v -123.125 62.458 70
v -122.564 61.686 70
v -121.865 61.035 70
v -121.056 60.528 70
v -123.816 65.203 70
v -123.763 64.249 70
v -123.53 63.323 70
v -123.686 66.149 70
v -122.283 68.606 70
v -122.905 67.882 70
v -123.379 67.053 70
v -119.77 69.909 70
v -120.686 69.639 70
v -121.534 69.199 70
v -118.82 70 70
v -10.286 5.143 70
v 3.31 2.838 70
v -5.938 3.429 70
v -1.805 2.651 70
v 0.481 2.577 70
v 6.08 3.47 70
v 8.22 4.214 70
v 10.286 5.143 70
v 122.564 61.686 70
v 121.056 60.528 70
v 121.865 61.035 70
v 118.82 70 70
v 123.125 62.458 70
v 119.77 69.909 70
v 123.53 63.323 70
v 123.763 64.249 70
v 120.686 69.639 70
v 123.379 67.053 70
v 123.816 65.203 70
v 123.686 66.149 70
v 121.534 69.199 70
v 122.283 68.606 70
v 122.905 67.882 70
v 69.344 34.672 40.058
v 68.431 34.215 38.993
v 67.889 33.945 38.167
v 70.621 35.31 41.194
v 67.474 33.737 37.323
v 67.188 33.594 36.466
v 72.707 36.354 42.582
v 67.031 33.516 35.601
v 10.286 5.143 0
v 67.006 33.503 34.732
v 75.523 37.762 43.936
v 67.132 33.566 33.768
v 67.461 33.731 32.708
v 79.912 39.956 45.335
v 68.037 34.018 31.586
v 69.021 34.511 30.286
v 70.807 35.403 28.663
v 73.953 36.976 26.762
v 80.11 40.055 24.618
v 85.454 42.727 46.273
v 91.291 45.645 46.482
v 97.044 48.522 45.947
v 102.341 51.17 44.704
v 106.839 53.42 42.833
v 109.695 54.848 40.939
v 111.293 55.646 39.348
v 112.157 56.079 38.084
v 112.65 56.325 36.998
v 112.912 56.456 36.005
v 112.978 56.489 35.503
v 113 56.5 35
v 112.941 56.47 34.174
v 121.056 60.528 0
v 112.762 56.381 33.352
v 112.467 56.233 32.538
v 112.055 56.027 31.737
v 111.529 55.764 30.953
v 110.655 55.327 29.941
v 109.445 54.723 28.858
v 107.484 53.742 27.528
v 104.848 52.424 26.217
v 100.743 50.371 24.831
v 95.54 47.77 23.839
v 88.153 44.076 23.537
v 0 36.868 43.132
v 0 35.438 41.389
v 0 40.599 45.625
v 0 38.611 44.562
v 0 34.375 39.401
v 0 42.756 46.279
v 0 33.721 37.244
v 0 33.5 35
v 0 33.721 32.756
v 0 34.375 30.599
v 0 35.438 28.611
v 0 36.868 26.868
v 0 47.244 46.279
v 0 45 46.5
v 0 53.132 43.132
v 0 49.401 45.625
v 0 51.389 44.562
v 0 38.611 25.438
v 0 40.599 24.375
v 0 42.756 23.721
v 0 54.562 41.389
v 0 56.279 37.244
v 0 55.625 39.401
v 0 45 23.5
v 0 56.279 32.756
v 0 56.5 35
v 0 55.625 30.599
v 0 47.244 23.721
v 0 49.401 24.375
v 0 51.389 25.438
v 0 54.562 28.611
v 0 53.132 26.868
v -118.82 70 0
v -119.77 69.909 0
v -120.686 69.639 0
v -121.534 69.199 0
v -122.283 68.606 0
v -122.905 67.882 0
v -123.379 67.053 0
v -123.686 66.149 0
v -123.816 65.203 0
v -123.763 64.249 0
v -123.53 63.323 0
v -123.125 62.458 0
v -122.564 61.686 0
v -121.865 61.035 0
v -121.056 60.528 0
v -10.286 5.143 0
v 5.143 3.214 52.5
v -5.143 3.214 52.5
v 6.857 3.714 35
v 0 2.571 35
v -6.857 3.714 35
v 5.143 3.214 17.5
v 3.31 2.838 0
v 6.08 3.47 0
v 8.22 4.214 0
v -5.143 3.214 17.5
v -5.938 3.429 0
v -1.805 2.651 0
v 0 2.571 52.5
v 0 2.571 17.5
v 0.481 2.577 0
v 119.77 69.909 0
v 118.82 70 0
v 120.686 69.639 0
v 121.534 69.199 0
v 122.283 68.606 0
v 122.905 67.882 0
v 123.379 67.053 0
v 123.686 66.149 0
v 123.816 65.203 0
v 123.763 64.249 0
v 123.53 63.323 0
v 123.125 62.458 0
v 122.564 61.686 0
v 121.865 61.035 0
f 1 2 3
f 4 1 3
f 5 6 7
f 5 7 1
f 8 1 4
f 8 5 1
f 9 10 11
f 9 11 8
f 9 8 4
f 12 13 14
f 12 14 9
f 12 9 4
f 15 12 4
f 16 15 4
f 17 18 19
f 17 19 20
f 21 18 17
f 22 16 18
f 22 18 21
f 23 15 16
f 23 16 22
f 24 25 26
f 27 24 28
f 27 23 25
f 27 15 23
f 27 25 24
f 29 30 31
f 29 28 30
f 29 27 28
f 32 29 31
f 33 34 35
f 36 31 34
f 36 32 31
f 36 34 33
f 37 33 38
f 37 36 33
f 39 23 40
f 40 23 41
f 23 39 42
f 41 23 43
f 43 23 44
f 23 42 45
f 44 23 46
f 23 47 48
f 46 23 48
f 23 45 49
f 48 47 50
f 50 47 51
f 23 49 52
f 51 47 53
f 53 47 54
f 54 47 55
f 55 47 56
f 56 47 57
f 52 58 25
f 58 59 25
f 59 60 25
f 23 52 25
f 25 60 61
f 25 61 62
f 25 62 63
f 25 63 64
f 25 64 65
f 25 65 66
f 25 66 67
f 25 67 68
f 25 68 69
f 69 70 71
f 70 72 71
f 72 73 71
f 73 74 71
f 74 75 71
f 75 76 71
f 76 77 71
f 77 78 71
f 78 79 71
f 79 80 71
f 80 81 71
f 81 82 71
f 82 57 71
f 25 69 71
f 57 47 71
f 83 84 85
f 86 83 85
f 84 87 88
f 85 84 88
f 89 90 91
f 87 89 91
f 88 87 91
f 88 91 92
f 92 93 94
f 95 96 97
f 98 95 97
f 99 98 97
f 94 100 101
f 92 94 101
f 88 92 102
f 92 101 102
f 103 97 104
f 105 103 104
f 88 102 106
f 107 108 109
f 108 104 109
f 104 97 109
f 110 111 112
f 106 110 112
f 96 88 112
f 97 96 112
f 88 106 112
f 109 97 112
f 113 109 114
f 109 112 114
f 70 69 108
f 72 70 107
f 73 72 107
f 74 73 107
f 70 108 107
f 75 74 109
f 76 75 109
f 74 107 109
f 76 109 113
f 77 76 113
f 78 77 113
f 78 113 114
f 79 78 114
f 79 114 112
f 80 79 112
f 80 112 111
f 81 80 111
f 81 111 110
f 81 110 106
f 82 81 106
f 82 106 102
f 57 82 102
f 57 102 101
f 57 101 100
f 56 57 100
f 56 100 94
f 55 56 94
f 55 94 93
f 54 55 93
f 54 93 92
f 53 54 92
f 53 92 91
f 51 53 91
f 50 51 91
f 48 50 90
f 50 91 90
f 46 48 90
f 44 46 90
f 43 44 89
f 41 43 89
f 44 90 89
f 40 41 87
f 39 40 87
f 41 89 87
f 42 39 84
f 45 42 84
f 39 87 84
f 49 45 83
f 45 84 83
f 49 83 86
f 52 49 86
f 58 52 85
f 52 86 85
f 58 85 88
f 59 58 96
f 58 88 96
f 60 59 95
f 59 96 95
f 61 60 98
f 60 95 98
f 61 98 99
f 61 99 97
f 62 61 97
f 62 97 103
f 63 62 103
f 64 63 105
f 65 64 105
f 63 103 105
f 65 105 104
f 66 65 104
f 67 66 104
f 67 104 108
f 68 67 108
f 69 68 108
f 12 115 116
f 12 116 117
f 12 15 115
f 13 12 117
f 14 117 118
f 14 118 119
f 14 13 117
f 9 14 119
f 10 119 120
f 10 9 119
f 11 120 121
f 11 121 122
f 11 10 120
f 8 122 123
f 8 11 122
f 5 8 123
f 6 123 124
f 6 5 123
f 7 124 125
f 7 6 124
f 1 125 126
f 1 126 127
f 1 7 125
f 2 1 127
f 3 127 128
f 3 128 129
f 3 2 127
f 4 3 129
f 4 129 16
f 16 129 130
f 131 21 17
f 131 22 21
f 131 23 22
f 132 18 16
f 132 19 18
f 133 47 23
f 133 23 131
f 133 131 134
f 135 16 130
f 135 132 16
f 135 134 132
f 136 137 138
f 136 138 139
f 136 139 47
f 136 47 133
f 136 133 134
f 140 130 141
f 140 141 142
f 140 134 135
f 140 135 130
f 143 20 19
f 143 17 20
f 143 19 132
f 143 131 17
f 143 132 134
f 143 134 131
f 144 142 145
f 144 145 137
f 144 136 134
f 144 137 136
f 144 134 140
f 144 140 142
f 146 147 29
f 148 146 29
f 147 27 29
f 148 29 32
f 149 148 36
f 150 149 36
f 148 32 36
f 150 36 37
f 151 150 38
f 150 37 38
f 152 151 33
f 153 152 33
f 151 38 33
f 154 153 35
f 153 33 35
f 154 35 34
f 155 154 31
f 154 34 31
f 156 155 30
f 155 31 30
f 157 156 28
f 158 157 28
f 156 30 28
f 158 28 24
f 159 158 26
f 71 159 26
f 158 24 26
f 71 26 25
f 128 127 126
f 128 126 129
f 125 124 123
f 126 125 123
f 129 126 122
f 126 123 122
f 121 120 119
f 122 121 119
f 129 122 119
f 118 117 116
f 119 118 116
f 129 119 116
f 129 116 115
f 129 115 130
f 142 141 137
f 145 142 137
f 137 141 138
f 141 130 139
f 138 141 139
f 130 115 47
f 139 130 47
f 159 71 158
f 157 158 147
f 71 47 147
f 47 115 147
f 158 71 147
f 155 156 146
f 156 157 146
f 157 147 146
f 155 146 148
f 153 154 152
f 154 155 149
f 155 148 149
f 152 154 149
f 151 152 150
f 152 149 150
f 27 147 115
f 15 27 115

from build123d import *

# Parameters (mm, degrees)
F1_DEPTH    = 70
F2_R        = 5
F3_T1_DEPTH = 127.5
F5_D        = 23
F5_DEPTH    = 123.8206602125


# Not quite as in the source:
# - a fillet or chamfer that OpenCascade refuses, or shapes differently, is made with other operations: its cross-section is extruded or revolved along the edge and cut away or added


with BuildPart() as f1:
    # F0 (on Top) → F1 (new body)
    with BuildSketch(Plane.XY):
        Polygon((140, 70), (-140, 70), (0, 0), align=None)
    extrude(amount=F1_DEPTH)

    # F2
    f2_edges = [f1.edges().sort_by_distance(p)[0] for p in [
        (140, 70, 35),
        (-140, 70, 35),
    ]]
    fillet(f2_edges, radius=F2_R)

    # F3: fillet of radius 23 on 1 edges, made by hand

    # F3_s2 → F3_t1 (cut)
    with BuildSketch(Plane.XY.offset(-28.75)):
        with BuildLine():
            add(Edge.make_bspline(
                [(10.2859126965, 5.1429563482), (0, 0), (-10.2859126965, 5.1429563482)],
                knots=[0, 0, 0, 1, 1, 1], degree=2, weights=[1, 1, 1]))
            Line((-10.2859126965, 5.1429563482), (0, 0))
            Line((0, 0), (10.2859126965, 5.1429563482))
        make_face()
    extrude(amount=F3_T1_DEPTH, mode=Mode.SUBTRACT)

    # F5 (through all, one way)
    with BuildSketch(Plane(origin=(0, 0, 0), x_dir=(0, 1, 0), z_dir=(-1, 0, 0))):
        with Locations((45, -35)):
            Circle(F5_D / 2)
    extrude(amount=-F5_DEPTH, mode=Mode.SUBTRACT)


solid = f1.part
